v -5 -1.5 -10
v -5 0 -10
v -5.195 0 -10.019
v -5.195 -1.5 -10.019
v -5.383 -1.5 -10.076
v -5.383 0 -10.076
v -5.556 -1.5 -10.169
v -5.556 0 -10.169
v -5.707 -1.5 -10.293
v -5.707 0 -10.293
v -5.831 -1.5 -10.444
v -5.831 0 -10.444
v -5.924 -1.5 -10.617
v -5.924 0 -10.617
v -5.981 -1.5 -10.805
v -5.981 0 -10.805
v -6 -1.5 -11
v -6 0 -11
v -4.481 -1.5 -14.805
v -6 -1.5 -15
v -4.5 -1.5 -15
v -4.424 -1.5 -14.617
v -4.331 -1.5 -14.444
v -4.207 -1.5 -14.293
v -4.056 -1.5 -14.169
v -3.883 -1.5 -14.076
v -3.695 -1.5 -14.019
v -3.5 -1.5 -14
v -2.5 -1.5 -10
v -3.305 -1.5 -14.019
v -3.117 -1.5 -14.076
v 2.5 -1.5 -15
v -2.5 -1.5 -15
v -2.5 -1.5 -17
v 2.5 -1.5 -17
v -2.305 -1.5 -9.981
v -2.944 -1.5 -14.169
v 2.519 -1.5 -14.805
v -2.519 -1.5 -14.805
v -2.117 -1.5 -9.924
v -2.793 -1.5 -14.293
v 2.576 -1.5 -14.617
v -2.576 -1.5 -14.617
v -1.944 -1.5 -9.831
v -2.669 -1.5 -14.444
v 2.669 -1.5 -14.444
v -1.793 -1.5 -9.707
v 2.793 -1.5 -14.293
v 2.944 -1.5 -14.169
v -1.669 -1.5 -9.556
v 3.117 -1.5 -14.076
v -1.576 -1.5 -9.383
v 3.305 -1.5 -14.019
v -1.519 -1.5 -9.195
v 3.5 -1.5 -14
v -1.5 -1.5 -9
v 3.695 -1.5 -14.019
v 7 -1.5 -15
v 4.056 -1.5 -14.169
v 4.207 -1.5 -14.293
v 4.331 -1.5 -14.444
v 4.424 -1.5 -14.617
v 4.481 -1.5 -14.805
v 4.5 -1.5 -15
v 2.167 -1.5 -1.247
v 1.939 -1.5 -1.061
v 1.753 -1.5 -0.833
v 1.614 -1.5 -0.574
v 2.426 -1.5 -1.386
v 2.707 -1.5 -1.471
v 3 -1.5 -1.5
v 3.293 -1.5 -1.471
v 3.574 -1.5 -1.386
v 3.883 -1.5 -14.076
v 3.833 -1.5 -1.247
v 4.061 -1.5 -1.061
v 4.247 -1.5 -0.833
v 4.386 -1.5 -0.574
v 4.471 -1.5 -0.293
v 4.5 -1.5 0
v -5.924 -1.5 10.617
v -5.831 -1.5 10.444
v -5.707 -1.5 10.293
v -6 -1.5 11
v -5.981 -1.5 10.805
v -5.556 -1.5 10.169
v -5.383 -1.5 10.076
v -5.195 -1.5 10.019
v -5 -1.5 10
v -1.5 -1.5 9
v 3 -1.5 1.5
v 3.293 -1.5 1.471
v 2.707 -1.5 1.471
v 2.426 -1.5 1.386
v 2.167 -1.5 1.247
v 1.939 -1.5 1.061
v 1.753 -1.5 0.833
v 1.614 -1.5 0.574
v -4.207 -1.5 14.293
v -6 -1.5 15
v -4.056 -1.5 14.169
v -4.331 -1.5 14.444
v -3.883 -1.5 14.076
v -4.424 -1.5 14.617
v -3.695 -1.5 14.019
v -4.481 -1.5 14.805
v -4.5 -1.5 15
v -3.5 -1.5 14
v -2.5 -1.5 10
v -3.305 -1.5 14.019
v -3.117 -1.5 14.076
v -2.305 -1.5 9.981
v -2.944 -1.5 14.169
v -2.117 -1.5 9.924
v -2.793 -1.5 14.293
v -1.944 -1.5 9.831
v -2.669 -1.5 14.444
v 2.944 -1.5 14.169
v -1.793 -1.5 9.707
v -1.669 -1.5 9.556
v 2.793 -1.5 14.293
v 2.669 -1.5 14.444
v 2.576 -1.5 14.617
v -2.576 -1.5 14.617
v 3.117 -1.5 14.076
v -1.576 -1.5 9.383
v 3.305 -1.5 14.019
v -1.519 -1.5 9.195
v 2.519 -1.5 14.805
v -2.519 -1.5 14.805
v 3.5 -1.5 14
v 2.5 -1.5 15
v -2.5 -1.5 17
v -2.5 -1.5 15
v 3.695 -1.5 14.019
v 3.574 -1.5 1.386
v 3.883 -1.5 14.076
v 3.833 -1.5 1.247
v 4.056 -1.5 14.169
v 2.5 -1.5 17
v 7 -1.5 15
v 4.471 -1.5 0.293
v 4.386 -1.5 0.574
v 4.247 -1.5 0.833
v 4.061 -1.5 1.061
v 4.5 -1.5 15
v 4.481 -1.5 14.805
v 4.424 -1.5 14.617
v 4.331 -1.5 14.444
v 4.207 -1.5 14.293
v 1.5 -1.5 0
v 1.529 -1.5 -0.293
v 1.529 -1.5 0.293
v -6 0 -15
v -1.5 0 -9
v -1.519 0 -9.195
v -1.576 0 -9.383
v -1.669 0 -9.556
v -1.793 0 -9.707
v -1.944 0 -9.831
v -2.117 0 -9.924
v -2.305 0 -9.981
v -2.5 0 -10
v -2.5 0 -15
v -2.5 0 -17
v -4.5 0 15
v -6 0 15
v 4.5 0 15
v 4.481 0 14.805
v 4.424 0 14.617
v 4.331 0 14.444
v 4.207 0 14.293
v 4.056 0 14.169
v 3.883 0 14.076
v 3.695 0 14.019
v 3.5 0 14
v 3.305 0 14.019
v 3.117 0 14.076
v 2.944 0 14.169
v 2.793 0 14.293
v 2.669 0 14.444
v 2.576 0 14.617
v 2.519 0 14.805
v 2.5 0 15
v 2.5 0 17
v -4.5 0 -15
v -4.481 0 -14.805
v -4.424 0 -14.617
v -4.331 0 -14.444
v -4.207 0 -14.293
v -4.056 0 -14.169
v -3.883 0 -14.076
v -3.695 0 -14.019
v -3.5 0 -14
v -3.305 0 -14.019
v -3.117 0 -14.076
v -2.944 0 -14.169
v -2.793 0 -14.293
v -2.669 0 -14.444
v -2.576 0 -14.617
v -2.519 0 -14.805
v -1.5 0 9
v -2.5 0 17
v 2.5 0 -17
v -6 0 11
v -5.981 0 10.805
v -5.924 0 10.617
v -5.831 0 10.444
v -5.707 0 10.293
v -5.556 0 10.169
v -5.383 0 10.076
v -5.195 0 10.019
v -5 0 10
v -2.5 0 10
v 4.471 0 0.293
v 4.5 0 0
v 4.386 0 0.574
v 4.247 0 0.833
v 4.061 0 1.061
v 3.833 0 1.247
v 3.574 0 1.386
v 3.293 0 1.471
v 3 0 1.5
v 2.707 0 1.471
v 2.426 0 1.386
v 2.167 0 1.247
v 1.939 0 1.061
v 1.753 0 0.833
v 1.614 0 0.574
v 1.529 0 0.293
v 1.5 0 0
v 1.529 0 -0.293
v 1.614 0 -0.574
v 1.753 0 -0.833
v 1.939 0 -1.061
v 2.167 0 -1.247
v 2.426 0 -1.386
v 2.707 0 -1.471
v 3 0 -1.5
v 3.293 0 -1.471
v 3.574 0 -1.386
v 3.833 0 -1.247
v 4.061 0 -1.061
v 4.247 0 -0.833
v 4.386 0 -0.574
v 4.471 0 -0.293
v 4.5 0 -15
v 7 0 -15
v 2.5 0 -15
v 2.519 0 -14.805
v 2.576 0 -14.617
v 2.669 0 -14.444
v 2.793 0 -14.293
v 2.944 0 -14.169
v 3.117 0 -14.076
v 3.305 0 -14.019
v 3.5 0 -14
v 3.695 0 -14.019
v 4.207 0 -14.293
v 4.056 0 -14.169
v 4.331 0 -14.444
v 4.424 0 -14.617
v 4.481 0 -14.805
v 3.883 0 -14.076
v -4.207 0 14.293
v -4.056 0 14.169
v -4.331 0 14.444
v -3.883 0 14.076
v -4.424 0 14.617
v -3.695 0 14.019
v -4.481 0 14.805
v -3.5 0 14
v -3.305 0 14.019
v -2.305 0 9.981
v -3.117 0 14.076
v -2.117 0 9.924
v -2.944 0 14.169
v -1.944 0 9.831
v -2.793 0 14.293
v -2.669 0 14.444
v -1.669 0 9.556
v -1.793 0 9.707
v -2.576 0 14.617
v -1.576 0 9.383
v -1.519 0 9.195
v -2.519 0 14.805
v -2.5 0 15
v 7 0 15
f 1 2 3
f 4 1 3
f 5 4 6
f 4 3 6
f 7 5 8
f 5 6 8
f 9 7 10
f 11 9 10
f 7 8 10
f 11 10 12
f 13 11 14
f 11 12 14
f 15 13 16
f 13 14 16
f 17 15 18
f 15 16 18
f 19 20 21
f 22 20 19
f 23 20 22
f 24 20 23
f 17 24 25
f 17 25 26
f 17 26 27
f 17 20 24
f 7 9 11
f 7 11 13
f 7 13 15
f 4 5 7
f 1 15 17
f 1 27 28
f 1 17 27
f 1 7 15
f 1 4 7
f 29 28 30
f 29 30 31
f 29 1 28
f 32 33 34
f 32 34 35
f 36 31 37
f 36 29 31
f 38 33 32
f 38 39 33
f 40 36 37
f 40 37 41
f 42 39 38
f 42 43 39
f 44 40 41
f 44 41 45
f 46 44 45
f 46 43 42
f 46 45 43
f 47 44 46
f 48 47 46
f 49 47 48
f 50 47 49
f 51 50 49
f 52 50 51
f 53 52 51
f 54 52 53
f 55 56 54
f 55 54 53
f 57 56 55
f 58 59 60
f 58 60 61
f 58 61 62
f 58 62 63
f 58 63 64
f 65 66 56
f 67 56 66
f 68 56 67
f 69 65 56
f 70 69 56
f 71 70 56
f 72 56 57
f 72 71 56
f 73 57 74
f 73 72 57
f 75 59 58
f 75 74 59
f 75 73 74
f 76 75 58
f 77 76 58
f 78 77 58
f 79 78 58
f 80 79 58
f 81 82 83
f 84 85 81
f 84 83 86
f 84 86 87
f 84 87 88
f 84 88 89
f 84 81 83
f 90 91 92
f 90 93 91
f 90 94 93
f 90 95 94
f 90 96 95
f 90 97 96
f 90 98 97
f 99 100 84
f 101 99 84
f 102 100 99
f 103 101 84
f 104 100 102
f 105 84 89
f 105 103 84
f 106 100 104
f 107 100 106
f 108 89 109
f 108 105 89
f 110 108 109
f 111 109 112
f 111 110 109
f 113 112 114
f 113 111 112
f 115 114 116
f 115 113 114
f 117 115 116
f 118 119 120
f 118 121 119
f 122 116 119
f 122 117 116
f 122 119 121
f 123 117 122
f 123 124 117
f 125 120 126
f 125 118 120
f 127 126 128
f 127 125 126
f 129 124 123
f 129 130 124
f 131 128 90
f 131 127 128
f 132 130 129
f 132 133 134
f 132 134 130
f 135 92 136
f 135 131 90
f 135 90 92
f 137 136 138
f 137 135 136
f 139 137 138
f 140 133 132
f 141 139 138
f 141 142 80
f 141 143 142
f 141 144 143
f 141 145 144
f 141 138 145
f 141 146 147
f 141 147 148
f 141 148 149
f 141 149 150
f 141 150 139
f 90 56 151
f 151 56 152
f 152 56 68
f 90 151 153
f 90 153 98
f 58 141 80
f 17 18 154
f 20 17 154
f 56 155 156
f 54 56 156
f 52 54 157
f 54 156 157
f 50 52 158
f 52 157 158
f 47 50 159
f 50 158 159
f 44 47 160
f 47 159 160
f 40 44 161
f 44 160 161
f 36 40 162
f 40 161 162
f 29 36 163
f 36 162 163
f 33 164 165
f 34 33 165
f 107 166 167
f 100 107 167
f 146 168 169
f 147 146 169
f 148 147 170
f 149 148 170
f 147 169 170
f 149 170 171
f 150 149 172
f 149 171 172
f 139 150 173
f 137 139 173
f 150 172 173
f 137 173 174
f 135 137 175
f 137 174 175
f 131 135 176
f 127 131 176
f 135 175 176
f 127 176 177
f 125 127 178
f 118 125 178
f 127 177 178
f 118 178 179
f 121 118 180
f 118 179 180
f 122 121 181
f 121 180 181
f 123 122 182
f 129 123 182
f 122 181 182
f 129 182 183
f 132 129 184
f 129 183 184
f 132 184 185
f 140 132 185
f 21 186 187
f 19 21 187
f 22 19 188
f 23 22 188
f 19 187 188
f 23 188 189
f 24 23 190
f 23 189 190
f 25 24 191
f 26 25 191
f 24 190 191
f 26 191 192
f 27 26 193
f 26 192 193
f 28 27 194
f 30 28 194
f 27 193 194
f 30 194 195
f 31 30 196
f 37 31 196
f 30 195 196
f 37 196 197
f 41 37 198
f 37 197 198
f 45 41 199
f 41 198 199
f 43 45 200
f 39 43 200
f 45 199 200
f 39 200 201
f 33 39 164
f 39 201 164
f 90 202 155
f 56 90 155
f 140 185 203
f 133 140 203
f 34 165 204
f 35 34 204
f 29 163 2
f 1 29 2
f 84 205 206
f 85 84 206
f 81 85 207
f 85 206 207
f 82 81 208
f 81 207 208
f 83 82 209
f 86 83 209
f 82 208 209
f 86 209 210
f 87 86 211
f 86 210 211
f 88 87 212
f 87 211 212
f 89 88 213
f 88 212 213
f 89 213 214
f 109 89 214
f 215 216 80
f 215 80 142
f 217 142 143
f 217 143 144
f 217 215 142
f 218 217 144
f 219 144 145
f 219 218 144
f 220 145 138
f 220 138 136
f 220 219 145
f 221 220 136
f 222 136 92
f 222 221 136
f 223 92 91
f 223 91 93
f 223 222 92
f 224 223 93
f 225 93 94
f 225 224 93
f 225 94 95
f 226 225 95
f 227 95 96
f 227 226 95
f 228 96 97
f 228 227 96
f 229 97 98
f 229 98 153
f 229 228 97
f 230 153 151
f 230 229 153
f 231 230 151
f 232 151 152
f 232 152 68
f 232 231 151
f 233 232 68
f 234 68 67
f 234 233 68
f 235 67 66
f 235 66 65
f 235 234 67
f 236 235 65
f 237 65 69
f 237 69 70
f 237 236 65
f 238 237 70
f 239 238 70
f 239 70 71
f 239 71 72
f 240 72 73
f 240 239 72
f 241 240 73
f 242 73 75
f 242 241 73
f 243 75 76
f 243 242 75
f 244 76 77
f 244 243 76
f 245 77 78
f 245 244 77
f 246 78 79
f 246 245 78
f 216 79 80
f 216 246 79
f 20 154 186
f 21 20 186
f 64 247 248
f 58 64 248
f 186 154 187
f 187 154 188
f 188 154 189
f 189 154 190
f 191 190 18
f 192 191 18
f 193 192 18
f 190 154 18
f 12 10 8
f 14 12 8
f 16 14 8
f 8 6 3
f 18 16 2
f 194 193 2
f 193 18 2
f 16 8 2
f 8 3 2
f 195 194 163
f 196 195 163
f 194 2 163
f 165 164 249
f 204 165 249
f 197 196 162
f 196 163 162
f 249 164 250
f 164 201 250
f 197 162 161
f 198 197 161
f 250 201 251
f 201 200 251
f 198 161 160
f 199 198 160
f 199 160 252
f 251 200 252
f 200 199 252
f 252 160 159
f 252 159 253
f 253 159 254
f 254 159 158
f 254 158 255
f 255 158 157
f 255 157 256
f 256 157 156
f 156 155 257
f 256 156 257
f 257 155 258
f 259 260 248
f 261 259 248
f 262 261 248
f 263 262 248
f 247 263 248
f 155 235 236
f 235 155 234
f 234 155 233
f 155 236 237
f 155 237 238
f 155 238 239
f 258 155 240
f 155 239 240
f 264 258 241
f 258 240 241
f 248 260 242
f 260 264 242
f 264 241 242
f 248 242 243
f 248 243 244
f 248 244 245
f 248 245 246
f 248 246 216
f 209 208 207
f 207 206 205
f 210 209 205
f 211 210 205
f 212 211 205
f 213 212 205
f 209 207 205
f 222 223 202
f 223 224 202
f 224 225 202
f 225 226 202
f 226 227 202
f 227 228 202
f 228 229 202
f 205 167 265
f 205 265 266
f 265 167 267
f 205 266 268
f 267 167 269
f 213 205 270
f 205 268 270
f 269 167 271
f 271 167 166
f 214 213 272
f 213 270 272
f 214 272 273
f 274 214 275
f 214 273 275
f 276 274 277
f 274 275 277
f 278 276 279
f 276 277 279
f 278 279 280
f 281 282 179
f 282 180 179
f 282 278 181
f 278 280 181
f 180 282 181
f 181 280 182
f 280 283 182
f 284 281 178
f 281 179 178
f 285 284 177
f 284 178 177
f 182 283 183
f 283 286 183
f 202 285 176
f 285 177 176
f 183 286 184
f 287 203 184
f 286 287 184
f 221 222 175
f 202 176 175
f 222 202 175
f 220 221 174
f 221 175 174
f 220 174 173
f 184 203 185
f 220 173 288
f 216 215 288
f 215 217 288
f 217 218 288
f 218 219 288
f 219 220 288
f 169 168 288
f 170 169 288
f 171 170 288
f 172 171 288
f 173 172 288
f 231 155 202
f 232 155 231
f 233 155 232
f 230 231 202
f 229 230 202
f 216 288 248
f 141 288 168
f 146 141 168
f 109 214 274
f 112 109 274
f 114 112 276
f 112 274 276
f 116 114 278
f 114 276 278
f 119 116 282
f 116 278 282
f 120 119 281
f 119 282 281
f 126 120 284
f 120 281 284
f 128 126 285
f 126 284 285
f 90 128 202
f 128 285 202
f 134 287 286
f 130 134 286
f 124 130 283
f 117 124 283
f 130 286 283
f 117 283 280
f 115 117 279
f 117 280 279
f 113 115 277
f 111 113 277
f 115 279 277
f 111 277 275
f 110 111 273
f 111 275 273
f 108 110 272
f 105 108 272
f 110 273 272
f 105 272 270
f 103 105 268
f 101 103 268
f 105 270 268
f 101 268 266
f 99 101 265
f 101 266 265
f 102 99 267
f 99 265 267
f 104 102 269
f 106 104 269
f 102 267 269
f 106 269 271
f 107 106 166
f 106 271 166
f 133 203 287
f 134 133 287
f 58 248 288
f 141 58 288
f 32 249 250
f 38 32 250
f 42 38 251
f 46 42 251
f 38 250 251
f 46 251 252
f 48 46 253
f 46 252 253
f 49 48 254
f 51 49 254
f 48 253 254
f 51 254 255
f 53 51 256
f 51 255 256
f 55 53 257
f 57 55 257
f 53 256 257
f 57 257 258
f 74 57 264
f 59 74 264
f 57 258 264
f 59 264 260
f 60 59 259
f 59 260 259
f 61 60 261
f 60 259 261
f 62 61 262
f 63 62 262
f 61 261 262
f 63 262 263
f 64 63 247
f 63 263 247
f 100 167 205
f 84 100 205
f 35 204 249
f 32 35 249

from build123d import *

# Parameters (mm, degrees)
F0_R     = 1.5
F1_DEPTH = 1.5


with BuildPart() as f1:
    # F0 (on Front) → F1 (new body)
    with BuildSketch(Plane.XZ):
        with BuildLine():
            Line((-4.5, 15), (-6, 15))
            Line((-6, 15), (-6, 11))
            ThreePointArc((-6, 11), (-5.707107, 10.292893), (-5, 10))
            Line((-5, 10), (-2.5, 10))
            ThreePointArc((-2.5, 10), (-1.792893, 9.707107), (-1.5, 9))
            Line((-1.5, 9), (-1.5, -9))
            ThreePointArc((-1.5, -9), (-1.792893, -9.707107), (-2.5, -10))
            Line((-2.5, -10), (-5, -10))
            ThreePointArc((-5, -10), (-5.707107, -10.292893), (-6, -11))
            Line((-6, -11), (-6, -15))
            Line((-6, -15), (-4.5, -15))
            ThreePointArc((-4.5, -15), (-3.5, -14), (-2.5, -15))
            Line((-2.5, -15), (-2.5, -17))
            Line((-2.5, -17), (2.5, -17))
            Line((2.5, -17), (2.5, -15))
            ThreePointArc((2.5, -15), (3.5, -14), (4.5, -15))
            Line((4.5, -15), (7, -15))
            Line((7, -15), (7, 15))
            Line((7, 15), (4.5, 15))
            ThreePointArc((4.5, 15), (3.5, 14), (2.5, 15))
            Line((2.5, 15), (2.5, 17))
            Line((2.5, 17), (-2.5, 17))
            Line((-2.5, 17), (-2.5, 15))
            ThreePointArc((-2.5, 15), (-3.5, 14), (-4.5, 15))
        make_face()
        with Locations((3, 0)):
            Circle(F0_R, mode=Mode.SUBTRACT)
    extrude(amount=F1_DEPTH)


solid = f1.part
